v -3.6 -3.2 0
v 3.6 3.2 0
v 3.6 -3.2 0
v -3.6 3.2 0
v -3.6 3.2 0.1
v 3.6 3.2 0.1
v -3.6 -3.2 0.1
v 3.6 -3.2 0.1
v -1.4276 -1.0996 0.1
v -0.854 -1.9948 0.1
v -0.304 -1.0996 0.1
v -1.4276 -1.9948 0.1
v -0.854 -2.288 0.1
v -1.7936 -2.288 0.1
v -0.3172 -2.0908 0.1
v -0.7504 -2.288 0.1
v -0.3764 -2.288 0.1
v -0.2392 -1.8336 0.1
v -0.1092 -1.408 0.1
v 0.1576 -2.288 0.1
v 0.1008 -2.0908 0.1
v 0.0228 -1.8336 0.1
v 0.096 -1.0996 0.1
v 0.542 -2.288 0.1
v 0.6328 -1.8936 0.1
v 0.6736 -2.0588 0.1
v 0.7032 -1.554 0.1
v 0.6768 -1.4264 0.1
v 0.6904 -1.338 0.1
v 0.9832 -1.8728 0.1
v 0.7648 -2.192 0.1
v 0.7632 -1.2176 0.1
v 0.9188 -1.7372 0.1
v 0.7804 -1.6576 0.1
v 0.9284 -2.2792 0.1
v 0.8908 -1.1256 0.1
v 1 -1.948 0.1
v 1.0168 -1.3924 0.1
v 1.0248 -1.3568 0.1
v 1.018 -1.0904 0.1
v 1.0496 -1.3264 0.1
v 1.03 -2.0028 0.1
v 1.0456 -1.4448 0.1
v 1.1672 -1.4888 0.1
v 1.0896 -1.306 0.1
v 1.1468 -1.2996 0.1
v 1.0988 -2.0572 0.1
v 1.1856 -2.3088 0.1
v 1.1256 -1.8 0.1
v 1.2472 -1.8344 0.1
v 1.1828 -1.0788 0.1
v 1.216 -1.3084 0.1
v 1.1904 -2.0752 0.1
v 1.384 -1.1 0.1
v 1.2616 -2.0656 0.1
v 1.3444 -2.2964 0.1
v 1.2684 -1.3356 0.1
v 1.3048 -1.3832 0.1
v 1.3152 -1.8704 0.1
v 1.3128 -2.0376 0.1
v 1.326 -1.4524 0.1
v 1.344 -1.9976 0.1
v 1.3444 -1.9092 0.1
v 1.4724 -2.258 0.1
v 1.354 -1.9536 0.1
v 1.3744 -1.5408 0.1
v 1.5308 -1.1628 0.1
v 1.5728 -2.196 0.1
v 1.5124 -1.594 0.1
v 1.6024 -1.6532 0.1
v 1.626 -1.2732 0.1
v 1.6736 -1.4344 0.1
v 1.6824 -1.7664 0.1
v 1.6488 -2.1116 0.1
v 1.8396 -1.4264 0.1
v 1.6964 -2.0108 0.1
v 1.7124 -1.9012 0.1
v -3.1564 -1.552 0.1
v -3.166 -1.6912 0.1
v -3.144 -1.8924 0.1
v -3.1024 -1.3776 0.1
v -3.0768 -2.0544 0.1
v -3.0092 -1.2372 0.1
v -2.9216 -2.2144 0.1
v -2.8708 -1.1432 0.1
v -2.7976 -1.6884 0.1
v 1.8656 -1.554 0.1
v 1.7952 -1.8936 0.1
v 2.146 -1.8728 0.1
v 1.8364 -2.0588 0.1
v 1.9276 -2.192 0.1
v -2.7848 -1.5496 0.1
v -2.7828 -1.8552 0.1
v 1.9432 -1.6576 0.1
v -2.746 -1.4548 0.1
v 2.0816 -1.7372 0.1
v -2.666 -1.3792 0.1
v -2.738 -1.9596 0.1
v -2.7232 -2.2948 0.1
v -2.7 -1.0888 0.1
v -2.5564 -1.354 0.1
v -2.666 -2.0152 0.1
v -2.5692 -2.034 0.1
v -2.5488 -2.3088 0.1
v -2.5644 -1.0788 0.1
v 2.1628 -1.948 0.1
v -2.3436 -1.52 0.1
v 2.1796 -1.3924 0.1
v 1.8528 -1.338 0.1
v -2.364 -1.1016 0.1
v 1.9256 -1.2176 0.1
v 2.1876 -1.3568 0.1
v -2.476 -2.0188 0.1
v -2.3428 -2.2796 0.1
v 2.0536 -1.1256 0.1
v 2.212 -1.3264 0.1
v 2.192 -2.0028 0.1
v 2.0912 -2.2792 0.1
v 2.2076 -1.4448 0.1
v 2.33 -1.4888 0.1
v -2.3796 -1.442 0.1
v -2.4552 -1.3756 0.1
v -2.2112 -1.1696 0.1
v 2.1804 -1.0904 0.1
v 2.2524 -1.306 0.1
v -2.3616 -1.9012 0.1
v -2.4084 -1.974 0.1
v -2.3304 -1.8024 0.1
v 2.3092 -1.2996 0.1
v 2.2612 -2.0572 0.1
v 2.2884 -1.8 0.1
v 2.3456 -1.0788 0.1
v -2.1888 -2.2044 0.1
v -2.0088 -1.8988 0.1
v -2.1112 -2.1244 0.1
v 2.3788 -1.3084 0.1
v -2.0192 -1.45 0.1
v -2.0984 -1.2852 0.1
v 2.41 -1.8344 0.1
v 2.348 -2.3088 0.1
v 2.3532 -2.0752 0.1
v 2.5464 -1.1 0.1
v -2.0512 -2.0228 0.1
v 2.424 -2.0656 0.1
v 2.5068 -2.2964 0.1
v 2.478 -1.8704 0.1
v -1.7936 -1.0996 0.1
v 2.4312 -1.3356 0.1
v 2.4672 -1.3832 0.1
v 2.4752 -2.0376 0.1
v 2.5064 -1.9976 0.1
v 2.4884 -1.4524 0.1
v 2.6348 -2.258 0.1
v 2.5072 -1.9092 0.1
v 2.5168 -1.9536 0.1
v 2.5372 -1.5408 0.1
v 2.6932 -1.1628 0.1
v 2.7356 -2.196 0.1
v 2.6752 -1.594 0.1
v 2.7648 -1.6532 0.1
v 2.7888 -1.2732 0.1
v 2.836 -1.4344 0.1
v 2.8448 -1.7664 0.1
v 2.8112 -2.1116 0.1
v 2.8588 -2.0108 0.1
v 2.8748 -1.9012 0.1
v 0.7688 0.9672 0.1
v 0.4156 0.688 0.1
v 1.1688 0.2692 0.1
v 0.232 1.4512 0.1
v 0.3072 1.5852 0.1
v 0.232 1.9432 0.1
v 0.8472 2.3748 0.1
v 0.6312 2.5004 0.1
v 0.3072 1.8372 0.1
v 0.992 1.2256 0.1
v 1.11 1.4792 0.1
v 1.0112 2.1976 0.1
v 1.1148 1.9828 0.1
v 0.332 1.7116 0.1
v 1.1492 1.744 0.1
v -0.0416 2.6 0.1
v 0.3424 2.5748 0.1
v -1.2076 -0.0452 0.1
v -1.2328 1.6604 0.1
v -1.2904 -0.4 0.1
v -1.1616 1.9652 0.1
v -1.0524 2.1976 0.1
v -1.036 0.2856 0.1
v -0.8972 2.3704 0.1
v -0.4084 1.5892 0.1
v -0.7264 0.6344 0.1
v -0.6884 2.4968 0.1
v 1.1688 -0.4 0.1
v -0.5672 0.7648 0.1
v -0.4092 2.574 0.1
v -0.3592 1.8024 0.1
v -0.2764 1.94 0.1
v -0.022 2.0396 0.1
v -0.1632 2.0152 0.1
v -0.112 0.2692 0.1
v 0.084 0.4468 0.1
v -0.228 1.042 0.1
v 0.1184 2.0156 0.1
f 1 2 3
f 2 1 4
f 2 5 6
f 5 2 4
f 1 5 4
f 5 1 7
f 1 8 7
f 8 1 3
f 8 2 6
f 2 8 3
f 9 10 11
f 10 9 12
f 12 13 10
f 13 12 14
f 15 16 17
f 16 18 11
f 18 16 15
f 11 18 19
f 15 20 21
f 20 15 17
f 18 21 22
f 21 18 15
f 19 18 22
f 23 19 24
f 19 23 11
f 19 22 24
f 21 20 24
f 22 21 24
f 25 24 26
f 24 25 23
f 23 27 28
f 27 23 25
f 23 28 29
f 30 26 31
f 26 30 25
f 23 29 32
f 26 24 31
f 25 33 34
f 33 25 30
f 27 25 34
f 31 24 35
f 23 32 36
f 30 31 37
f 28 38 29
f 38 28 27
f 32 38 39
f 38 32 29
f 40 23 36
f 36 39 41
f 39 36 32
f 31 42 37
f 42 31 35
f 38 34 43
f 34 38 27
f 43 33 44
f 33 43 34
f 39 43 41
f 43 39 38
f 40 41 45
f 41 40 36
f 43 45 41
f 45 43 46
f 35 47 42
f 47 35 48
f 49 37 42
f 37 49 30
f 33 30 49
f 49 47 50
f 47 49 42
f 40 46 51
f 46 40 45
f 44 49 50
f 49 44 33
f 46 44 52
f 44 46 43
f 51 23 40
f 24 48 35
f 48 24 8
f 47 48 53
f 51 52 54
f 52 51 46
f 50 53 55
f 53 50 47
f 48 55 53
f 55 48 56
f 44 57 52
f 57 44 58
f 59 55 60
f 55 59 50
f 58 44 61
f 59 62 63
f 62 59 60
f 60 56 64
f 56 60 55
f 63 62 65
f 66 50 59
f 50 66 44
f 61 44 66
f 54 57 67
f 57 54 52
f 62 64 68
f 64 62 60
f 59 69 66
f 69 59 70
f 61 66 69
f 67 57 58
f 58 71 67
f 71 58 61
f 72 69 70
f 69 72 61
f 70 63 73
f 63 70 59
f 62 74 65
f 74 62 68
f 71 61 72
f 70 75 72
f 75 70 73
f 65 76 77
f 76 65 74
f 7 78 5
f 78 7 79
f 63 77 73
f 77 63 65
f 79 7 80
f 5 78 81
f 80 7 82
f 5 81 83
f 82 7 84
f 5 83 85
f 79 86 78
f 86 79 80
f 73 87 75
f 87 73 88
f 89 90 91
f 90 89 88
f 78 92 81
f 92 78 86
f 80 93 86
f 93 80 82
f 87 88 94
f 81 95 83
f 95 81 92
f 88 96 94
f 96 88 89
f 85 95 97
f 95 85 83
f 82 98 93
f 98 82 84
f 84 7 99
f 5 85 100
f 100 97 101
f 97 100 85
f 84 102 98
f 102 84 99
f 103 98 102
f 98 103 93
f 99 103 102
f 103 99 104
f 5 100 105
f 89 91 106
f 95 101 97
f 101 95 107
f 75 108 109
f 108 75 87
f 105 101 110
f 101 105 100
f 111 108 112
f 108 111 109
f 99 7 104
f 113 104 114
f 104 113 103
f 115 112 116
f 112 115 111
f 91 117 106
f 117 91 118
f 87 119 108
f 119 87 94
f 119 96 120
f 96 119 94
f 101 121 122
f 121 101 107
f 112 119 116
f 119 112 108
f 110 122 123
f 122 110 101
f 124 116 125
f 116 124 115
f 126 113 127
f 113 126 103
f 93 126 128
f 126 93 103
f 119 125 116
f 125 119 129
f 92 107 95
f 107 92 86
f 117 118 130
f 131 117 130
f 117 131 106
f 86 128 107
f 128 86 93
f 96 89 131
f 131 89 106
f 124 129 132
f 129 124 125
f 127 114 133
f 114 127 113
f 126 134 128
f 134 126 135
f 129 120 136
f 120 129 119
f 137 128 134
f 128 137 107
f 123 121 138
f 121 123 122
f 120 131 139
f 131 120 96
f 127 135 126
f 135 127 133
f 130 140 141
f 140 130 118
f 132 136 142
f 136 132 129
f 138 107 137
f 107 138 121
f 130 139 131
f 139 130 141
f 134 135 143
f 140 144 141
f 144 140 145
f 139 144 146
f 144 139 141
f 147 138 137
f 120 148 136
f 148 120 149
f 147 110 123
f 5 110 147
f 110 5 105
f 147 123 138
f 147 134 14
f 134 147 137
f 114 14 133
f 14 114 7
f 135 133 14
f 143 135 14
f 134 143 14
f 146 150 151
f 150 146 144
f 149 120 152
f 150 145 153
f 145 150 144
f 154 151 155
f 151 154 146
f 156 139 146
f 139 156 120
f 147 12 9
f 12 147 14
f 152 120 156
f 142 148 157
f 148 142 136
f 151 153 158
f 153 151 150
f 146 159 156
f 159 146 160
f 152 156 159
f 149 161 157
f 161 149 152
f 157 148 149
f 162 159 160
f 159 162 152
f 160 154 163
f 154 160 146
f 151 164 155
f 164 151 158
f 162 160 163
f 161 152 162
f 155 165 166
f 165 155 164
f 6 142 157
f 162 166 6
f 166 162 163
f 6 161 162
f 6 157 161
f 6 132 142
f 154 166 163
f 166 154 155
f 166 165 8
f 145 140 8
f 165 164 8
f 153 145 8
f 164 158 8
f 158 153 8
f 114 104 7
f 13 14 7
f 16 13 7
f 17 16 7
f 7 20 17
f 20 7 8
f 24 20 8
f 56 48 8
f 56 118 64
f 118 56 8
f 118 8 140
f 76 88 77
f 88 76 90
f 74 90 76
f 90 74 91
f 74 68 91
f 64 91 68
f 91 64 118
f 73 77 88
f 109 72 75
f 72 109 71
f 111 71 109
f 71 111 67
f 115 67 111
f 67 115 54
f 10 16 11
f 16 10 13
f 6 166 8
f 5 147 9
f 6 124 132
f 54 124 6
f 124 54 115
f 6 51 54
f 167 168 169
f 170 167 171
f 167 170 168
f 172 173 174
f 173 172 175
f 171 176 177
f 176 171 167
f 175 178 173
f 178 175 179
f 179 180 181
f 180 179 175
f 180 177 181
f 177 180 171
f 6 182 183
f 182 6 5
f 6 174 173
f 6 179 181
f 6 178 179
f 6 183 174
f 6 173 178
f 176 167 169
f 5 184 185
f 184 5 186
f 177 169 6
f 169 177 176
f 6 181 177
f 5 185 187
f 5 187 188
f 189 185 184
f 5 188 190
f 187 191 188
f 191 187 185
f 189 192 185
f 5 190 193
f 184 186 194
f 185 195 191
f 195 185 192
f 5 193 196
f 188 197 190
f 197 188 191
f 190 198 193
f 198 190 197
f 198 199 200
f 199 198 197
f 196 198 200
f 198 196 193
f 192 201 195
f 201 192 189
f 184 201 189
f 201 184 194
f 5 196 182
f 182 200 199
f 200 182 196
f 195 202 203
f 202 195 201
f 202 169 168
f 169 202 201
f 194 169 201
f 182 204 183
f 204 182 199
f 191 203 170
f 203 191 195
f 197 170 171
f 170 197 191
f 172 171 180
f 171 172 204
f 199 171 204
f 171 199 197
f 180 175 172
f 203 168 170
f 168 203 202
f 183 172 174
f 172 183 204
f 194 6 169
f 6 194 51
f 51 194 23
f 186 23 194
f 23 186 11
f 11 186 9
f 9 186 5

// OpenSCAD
// file: ../p/box5-12.scad
use <../lib.scad>
function ldraw_lib__box5_12() = [
// 0 Box with 5 Faces without Any Edges
// 0 Name: box5-12.dat
// 0 Author: Chris Dee [cwdee]
// 0 !LDRAW_ORG Primitive UPDATE 2009-02
// 0 !LICENSE Licensed under CC BY 4.0 : see CAreadme.txt
// 
// 0 BFC CERTIFY CCW
  [0,"BFC","CERTIFY"],
  [0,"BFC","CCW"],
// 
// 0 !HISTORY 2009-09-03 [PTadmin] Official Update 2009-02
// 
// 
// 4 16 1 1 1 1 1 -1 -1 1 -1 -1 1 1
  [4,16,1,1,1,1,1,-1,-1,1,-1,-1,1,1],
// 4 16 -1 0 1 1 0 1 1 1 1 -1 1 1
  [4,16,-1,0,1,1,0,1,1,1,1,-1,1,1],
// 4 16 -1 0 -1 -1 0 1 -1 1 1 -1 1 -1
  [4,16,-1,0,-1,-1,0,1,-1,1,1,-1,1,-1],
// 4 16 1 0 -1 -1 0 -1 -1 1 -1 1 1 -1
  [4,16,1,0,-1,-1,0,-1,-1,1,-1,1,1,-1],
// 4 16 1 0 1 1 0 -1 1 1 -1 1 1 1
  [4,16,1,0,1,1,0,-1,1,1,-1,1,1,1],
// 0
];
module ldraw_lib__box5_12(step=0, col=false, unit=2/5, alt=false, line=0.2, solid=!$preview)
    makepoly(ldraw_lib__box5_12(), step=step, col=col, unit=unit, alt=alt, line=line, solid=solid);
ldraw_lib__box5_12(line=0.2);
// main file
use <../lib.scad>
use <s/4296207gs01.scad>
function ldraw_lib__4296207h() = [
// 0 Sticker 0.8 x  0.9 with White "2 CLASS"
// 0 Name: 4296207h.dat
// 0 Author: Gerald Lasser [GeraldLasser]
// 0 !LDRAW_ORG Part UPDATE 2024-03
// 0 !LICENSE Licensed under CC BY 4.0 : see CAreadme.txt
// 
// 0 BFC CERTIFY CCW
  [0,"BFC","CERTIFY"],
  [0,"BFC","CCW"],
// 
// 0 !KEYWORDS Font Impact, Set 7897
// 
// 0 !HISTORY 2024-04-28 [OrionP] Official Update 2024-03
// 
// 
// 1 16 0 0 0 1 0 0 0 1 0 0 0 1 s\4296207gs01.dat
  [1,16,0,0,0,1,0,0,0,1,0,0,0,1, ldraw_lib__s__4296207gs01()],
// 
// 3 16 1.922 -.25 2.418 1.039 -.25 1.72 2.922 -.25 .673
  [3,16,1.922,-.25,2.418,1.039,-.25,1.72,2.922,-.25,.673],
// 4 15 1.039 -.25 1.72 1.922 -.25 2.418 .768 -.25 3.963 .58 -.25 3.628
  [4,15,1.039,-.25,1.72,1.922,-.25,2.418,.768,-.25,3.963,.58,-.25,3.628],
// 4 15 .768 -.25 4.593 2.118 -.25 5.937 1.578 -.25 6.251 .58 -.25 4.858
  [4,15,.768,-.25,4.593,2.118,-.25,5.937,1.578,-.25,6.251,.58,-.25,4.858],
// 4 15 1.922 -.25 2.418 2.48 -.25 3.064 2.775 -.25 3.698 .768 -.25 3.963
  [4,15,1.922,-.25,2.418,2.48,-.25,3.064,2.775,-.25,3.698,.768,-.25,3.963],
// 4 15 2.118 -.25 5.937 .768 -.25 4.593 2.787 -.25 4.957 2.528 -.25 5.494
  [4,15,2.118,-.25,5.937,.768,-.25,4.593,2.787,-.25,4.957,2.528,-.25,5.494],
// 4 15 .768 -.25 4.593 .83 -.25 4.279 2.873 -.25 4.36 2.787 -.25 4.957
  [4,15,.768,-.25,4.593,.83,-.25,4.279,2.873,-.25,4.36,2.787,-.25,4.957],
// 4 15 .768 -.25 3.963 2.775 -.25 3.698 2.873 -.25 4.36 .83 -.25 4.279
  [4,15,.768,-.25,3.963,2.775,-.25,3.698,2.873,-.25,4.36,.83,-.25,4.279],
// 4 16 -9 -.25 8 -.104 -.25 6.5 .856 -.25 6.437 9 -.25 8
  [4,16,-9,-.25,8,-.104,-.25,6.5,.856,-.25,6.437,9,-.25,8],
// 3 16 9 -.25 8 1.578 -.25 6.251 2.118 -.25 5.937
  [3,16,9,-.25,8,1.578,-.25,6.251,2.118,-.25,5.937],
// 3 16 9 -.25 8 2.787 -.25 4.957 2.873 -.25 4.36
  [3,16,9,-.25,8,2.787,-.25,4.957,2.873,-.25,4.36],
// 3 16 9 -.25 8 2.528 -.25 5.494 2.787 -.25 4.957
  [3,16,9,-.25,8,2.528,-.25,5.494,2.787,-.25,4.957],
// 3 16 9 -.25 8 .856 -.25 6.437 1.578 -.25 6.251
  [3,16,9,-.25,8,.856,-.25,6.437,1.578,-.25,6.251],
// 3 16 9 -.25 8 2.118 -.25 5.937 2.528 -.25 5.494
  [3,16,9,-.25,8,2.118,-.25,5.937,2.528,-.25,5.494],
// 3 16 2.48 -.25 3.064 1.922 -.25 2.418 2.922 -.25 .673
  [3,16,2.48,-.25,3.064,1.922,-.25,2.418,2.922,-.25,.673],
// 4 16 -3.226 -.25 -1 -3.019 -.25 -.113 -3.082 -.25 4.151 -9 -.25 8
  [4,16,-3.226,-.25,-1,-3.019,-.25,-.113,-3.082,-.25,4.151,-9,-.25,8],
// 4 16 2.48 -.25 3.064 2.922 -.25 .673 9 -.25 8 2.775 -.25 3.698
  [4,16,2.48,-.25,3.064,2.922,-.25,.673,9,-.25,8,2.775,-.25,3.698],
// 3 16 9 -.25 8 2.873 -.25 4.36 2.775 -.25 3.698
  [3,16,9,-.25,8,2.873,-.25,4.36,2.775,-.25,3.698],
// 3 16 -9 -.25 8 -3.082 -.25 4.151 -2.904 -.25 4.913
  [3,16,-9,-.25,8,-3.082,-.25,4.151,-2.904,-.25,4.913],
// 3 16 -9 -.25 8 -2.904 -.25 4.913 -2.631 -.25 5.494
  [3,16,-9,-.25,8,-2.904,-.25,4.913,-2.631,-.25,5.494],
// 3 16 -2.59 -.25 .714 -3.082 -.25 4.151 -3.019 -.25 -.113
  [3,16,-2.59,-.25,.714,-3.082,-.25,4.151,-3.019,-.25,-.113],
// 3 16 -9 -.25 8 -2.631 -.25 5.494 -2.243 -.25 5.926
  [3,16,-9,-.25,8,-2.631,-.25,5.494,-2.243,-.25,5.926],
// 4 15 -3.082 -.25 4.151 -1.021 -.25 3.973 -2.631 -.25 5.494 -2.904 -.25 4.913
  [4,15,-3.082,-.25,4.151,-1.021,-.25,3.973,-2.631,-.25,5.494,-2.904,-.25,4.913],
// 3 16 -2.59 -.25 .714 -1.816 -.25 1.586 -3.082 -.25 4.151
  [3,16,-2.59,-.25,.714,-1.816,-.25,1.586,-3.082,-.25,4.151],
// 3 16 -9 -.25 8 -2.243 -.25 5.926 -1.721 -.25 6.242
  [3,16,-9,-.25,8,-2.243,-.25,5.926,-1.721,-.25,6.242],
// 3 15 -3.019 -.25 -.113 -3.226 -.25 -1 2.922 -.25 -1
  [3,15,-3.019,-.25,-.113,-3.226,-.25,-1,2.922,-.25,-1],
// 4 16 -3.082 -.25 4.151 -1.816 -.25 1.586 -1.418 -.25 1.912 -1.021 -.25 3.973
  [4,16,-3.082,-.25,4.151,-1.816,-.25,1.586,-1.418,-.25,1.912,-1.021,-.25,3.973],
// 3 16 -9 -.25 8 -1.721 -.25 6.242 -1.023 -.25 6.435
  [3,16,-9,-.25,8,-1.721,-.25,6.242,-1.023,-.25,6.435],
// 4 15 -1.021 -.25 3.973 -.898 -.25 4.506 -2.243 -.25 5.926 -2.631 -.25 5.494
  [4,15,-1.021,-.25,3.973,-.898,-.25,4.506,-2.243,-.25,5.926,-2.631,-.25,5.494],
// 4 15 -1.721 -.25 6.242 -2.243 -.25 5.926 -.898 -.25 4.506 -.691 -.25 4.85
  [4,15,-1.721,-.25,6.242,-2.243,-.25,5.926,-.898,-.25,4.506,-.691,-.25,4.85],
// 4 16 -.055 -.25 5.099 -.408 -.25 5.038 -.691 -.25 4.85 -.898 -.25 4.506
  [4,16,-.055,-.25,5.099,-.408,-.25,5.038,-.691,-.25,4.85,-.898,-.25,4.506],
// 4 15 -1.721 -.25 6.242 -.691 -.25 4.85 -.408 -.25 5.038 -1.023 -.25 6.435
  [4,15,-1.721,-.25,6.242,-.691,-.25,4.85,-.408,-.25,5.038,-1.023,-.25,6.435],
// 4 15 -1.418 -.25 1.912 -1.816 -.25 1.586 -2.59 -.25 .714 -.28 -.25 .673
  [4,15,-1.418,-.25,1.912,-1.816,-.25,1.586,-2.59,-.25,.714,-.28,-.25,.673],
// 4 15 -3.019 -.25 -.113 2.922 -.25 -1 -.28 -.25 .673 -2.59 -.25 .714
  [4,15,-3.019,-.25,-.113,2.922,-.25,-1,-.28,-.25,.673,-2.59,-.25,.714],
// 3 16 -9 -.25 8 -1.023 -.25 6.435 -.104 -.25 6.5
  [3,16,-9,-.25,8,-1.023,-.25,6.435,-.104,-.25,6.5],
// 4 15 -1.023 -.25 6.435 -.408 -.25 5.038 -.055 -.25 5.099 -.104 -.25 6.5
  [4,15,-1.023,-.25,6.435,-.408,-.25,5.038,-.055,-.25,5.099,-.104,-.25,6.5],
// 4 15 -.57 -.25 2.605 -1.418 -.25 1.912 -.28 -.25 .673 .21 -.25 1.117
  [4,15,-.57,-.25,2.605,-1.418,-.25,1.912,-.28,-.25,.673,.21,-.25,1.117],
// 4 16 1.039 -.25 1.72 .21 -.25 1.117 -.28 -.25 .673 2.922 -.25 .673
  [4,16,1.039,-.25,1.72,.21,-.25,1.117,-.28,-.25,.673,2.922,-.25,.673],
// 3 15 2.922 -.25 -1 2.922 -.25 .673 -.28 -.25 .673
  [3,15,2.922,-.25,-1,2.922,-.25,.673,-.28,-.25,.673],
// 4 15 .856 -.25 6.437 -.104 -.25 6.5 -.055 -.25 5.099 .296 -.25 5.039
  [4,15,.856,-.25,6.437,-.104,-.25,6.5,-.055,-.25,5.099,.296,-.25,5.039],
// 4 16 -1.418 -.25 1.912 -.57 -.25 2.605 .58 -.25 3.628 -1.021 -.25 3.973
  [4,16,-1.418,-.25,1.912,-.57,-.25,2.605,.58,-.25,3.628,-1.021,-.25,3.973],
// 4 16 .768 -.25 3.963 -.898 -.25 4.506 -1.021 -.25 3.973 .58 -.25 3.628
  [4,16,.768,-.25,3.963,-.898,-.25,4.506,-1.021,-.25,3.973,.58,-.25,3.628],
// 4 16 .83 -.25 4.279 .58 -.25 4.858 .296 -.25 5.039 .768 -.25 3.963
  [4,16,.83,-.25,4.279,.58,-.25,4.858,.296,-.25,5.039,.768,-.25,3.963],
// 4 16 -.898 -.25 4.506 .768 -.25 3.963 .296 -.25 5.039 -.055 -.25 5.099
  [4,16,-.898,-.25,4.506,.768,-.25,3.963,.296,-.25,5.039,-.055,-.25,5.099],
// 3 16 .83 -.25 4.279 .768 -.25 4.593 .58 -.25 4.858
  [3,16,.83,-.25,4.279,.768,-.25,4.593,.58,-.25,4.858],
// 4 15 .21 -.25 1.117 1.039 -.25 1.72 .58 -.25 3.628 -.57 -.25 2.605
  [4,15,.21,-.25,1.117,1.039,-.25,1.72,.58,-.25,3.628,-.57,-.25,2.605],
// 4 15 .296 -.25 5.039 .58 -.25 4.858 1.578 -.25 6.251 .856 -.25 6.437
  [4,15,.296,-.25,5.039,.58,-.25,4.858,1.578,-.25,6.251,.856,-.25,6.437],
// 4 16 2.957 -.25 -2.697 9 -.25 8 2.922 -.25 .673 2.922 -.25 -1
  [4,16,2.957,-.25,-2.697,9,-.25,8,2.922,-.25,.673,2.922,-.25,-1],
// 3 16 2.957 -.25 -2.697 2.922 -.25 -1 .24 -.25 -2.749
  [3,16,2.957,-.25,-2.697,2.922,-.25,-1,.24,-.25,-2.749],
// 4 16 -3.226 -.25 -1 -.76 -.25 -2.749 .24 -.25 -2.749 2.922 -.25 -1
  [4,16,-3.226,-.25,-1,-.76,-.25,-2.749,.24,-.25,-2.749,2.922,-.25,-1],
// 3 16 -.76 -.25 -2.749 -3.226 -.25 -1 -3.569 -.25 -2.749
  [3,16,-.76,-.25,-2.749,-3.226,-.25,-1,-3.569,-.25,-2.749],
// 3 16 -3.569 -.25 -2.749 -3.226 -.25 -1 -9 -.25 8
  [3,16,-3.569,-.25,-2.749,-3.226,-.25,-1,-9,-.25,8],
];
module ldraw_lib__4296207h(step=0, col=false, unit=2/5, alt=false, line=0.2, solid=!$preview)
    makepoly(ldraw_lib__4296207h(), step=step, col=col, unit=unit, alt=alt, line=line, solid=solid);
ldraw_lib__4296207h(line=0.2);
